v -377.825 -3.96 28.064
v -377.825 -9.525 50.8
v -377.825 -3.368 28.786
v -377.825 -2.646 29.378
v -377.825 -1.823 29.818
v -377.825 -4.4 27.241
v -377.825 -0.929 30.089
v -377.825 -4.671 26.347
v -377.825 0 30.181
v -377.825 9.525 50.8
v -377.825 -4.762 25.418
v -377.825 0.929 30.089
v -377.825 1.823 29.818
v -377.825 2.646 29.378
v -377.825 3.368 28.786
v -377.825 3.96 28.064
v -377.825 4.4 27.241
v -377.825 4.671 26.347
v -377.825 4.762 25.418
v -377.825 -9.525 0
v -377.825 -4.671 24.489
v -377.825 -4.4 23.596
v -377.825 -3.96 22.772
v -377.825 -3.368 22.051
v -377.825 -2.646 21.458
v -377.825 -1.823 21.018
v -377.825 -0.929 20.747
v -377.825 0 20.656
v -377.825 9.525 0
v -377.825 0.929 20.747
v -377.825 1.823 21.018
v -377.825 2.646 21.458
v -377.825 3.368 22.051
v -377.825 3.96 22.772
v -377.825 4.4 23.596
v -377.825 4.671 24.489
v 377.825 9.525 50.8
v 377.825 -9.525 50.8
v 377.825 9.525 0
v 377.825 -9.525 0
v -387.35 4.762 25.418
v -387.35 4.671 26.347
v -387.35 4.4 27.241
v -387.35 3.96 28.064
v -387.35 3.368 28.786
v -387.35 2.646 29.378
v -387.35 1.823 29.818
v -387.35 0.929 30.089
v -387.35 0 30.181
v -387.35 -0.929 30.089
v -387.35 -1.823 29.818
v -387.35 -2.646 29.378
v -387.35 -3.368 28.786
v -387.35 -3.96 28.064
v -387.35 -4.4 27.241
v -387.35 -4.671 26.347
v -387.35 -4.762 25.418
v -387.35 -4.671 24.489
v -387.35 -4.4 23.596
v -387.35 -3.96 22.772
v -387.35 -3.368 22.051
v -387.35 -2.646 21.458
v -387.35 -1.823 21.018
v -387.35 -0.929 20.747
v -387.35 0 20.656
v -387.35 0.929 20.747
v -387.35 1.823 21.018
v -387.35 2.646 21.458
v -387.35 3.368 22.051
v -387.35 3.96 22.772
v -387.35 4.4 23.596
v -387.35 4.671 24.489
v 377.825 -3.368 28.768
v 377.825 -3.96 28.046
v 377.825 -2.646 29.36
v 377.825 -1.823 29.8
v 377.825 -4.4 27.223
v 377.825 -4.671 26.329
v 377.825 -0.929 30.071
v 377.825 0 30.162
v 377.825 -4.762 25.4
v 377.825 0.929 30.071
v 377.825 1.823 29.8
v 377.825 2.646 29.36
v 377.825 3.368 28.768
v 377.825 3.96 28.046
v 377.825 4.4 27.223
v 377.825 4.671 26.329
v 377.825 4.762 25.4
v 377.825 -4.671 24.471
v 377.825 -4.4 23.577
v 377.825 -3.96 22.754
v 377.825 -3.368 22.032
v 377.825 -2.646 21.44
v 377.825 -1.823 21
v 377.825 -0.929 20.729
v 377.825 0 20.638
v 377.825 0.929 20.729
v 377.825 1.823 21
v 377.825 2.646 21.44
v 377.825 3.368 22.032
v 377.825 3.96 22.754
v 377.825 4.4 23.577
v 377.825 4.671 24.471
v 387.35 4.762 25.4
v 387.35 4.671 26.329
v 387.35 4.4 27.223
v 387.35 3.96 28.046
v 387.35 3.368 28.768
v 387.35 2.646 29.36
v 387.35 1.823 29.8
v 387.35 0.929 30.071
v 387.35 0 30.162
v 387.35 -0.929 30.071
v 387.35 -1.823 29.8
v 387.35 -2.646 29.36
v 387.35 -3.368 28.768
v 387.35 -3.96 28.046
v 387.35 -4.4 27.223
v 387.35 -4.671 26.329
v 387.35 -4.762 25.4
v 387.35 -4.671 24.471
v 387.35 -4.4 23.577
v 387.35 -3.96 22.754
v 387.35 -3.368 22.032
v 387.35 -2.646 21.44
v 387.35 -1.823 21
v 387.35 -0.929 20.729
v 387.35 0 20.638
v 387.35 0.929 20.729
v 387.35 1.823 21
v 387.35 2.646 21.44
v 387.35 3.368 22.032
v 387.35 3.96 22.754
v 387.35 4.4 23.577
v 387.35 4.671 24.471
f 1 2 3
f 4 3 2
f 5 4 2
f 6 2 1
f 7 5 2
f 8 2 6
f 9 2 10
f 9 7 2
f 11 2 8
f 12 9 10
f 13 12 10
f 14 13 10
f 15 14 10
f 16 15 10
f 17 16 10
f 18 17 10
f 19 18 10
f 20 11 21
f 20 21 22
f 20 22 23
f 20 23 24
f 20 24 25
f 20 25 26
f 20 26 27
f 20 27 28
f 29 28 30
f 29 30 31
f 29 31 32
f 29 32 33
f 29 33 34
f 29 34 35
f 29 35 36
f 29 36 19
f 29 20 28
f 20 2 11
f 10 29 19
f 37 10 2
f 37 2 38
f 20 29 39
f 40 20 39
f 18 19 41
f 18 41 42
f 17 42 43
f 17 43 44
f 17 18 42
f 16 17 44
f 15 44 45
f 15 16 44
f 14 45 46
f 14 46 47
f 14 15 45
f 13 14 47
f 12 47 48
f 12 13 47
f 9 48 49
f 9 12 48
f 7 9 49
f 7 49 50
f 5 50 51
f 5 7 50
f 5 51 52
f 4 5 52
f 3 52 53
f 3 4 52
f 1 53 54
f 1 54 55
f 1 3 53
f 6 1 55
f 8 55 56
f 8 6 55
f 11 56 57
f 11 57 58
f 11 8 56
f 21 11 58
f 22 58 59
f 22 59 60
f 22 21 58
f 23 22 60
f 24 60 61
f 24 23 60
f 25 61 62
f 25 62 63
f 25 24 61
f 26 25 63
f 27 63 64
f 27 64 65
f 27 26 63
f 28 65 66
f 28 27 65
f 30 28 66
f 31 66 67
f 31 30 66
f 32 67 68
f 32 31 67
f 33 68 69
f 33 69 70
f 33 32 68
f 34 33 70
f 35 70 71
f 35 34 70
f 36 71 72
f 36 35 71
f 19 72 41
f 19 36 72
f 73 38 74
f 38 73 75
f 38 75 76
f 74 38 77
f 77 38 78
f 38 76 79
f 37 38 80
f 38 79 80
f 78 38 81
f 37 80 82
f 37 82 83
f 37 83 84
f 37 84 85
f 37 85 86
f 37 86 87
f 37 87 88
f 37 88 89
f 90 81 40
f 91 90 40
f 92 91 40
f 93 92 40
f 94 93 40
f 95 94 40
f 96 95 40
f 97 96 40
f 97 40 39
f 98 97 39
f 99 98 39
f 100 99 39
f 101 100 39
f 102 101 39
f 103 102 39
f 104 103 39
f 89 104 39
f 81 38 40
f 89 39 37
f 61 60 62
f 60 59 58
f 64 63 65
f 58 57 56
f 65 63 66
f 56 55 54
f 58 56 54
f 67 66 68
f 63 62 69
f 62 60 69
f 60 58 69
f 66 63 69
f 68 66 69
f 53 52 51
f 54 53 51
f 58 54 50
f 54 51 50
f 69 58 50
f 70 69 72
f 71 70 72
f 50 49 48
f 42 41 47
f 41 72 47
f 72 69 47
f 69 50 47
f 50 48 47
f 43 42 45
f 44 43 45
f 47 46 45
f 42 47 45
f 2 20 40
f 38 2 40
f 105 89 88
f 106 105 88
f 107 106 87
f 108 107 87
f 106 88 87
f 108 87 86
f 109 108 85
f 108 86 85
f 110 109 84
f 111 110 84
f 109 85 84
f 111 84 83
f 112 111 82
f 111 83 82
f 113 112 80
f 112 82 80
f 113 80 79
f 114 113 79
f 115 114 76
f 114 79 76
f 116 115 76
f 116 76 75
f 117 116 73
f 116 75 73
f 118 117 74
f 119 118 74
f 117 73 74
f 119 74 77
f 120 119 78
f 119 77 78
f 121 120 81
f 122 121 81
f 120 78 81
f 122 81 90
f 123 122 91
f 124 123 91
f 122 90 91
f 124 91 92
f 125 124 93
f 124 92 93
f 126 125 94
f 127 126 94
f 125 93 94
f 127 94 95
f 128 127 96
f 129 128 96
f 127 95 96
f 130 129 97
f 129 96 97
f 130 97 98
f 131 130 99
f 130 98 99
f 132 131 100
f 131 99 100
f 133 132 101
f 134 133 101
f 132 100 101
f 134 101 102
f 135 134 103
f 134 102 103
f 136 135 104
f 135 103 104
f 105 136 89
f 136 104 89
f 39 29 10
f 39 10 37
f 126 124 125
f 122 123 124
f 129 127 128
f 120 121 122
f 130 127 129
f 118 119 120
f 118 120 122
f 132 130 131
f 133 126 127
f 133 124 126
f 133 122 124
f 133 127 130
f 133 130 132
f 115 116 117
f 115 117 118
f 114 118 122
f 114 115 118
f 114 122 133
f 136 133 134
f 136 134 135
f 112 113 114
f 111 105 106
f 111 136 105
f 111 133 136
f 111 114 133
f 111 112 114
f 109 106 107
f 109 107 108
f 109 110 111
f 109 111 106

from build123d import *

# Parameters (mm, degrees)
F0_W     = 755.65
F0_H     = 19.05
F1_DEPTH = 50.8
F3_R     = 4.7625
F4_DEPTH = 9.525
F6_R     = 4.7625
F7_DEPTH = 9.525


with BuildPart() as f1:
    # F0 (on Top) → F1 (new body)
    with BuildSketch(Plane.XY):
        Rectangle(F0_W, F0_H)
    extrude(amount=F1_DEPTH)

    # F3 (on offset) → F4 (join)
    with BuildSketch(Plane.YZ.offset(377.825)):
        with Locations((0, 25.4)):
            Circle(F3_R)
    extrude(amount=F4_DEPTH)

    # F6 (on offset) → F7 (join)
    with BuildSketch(Plane.YZ.offset(-377.825)):
        with Locations((0, 25.418339)):
            Circle(F6_R)
    extrude(amount=-F7_DEPTH)


solid = f1.part
